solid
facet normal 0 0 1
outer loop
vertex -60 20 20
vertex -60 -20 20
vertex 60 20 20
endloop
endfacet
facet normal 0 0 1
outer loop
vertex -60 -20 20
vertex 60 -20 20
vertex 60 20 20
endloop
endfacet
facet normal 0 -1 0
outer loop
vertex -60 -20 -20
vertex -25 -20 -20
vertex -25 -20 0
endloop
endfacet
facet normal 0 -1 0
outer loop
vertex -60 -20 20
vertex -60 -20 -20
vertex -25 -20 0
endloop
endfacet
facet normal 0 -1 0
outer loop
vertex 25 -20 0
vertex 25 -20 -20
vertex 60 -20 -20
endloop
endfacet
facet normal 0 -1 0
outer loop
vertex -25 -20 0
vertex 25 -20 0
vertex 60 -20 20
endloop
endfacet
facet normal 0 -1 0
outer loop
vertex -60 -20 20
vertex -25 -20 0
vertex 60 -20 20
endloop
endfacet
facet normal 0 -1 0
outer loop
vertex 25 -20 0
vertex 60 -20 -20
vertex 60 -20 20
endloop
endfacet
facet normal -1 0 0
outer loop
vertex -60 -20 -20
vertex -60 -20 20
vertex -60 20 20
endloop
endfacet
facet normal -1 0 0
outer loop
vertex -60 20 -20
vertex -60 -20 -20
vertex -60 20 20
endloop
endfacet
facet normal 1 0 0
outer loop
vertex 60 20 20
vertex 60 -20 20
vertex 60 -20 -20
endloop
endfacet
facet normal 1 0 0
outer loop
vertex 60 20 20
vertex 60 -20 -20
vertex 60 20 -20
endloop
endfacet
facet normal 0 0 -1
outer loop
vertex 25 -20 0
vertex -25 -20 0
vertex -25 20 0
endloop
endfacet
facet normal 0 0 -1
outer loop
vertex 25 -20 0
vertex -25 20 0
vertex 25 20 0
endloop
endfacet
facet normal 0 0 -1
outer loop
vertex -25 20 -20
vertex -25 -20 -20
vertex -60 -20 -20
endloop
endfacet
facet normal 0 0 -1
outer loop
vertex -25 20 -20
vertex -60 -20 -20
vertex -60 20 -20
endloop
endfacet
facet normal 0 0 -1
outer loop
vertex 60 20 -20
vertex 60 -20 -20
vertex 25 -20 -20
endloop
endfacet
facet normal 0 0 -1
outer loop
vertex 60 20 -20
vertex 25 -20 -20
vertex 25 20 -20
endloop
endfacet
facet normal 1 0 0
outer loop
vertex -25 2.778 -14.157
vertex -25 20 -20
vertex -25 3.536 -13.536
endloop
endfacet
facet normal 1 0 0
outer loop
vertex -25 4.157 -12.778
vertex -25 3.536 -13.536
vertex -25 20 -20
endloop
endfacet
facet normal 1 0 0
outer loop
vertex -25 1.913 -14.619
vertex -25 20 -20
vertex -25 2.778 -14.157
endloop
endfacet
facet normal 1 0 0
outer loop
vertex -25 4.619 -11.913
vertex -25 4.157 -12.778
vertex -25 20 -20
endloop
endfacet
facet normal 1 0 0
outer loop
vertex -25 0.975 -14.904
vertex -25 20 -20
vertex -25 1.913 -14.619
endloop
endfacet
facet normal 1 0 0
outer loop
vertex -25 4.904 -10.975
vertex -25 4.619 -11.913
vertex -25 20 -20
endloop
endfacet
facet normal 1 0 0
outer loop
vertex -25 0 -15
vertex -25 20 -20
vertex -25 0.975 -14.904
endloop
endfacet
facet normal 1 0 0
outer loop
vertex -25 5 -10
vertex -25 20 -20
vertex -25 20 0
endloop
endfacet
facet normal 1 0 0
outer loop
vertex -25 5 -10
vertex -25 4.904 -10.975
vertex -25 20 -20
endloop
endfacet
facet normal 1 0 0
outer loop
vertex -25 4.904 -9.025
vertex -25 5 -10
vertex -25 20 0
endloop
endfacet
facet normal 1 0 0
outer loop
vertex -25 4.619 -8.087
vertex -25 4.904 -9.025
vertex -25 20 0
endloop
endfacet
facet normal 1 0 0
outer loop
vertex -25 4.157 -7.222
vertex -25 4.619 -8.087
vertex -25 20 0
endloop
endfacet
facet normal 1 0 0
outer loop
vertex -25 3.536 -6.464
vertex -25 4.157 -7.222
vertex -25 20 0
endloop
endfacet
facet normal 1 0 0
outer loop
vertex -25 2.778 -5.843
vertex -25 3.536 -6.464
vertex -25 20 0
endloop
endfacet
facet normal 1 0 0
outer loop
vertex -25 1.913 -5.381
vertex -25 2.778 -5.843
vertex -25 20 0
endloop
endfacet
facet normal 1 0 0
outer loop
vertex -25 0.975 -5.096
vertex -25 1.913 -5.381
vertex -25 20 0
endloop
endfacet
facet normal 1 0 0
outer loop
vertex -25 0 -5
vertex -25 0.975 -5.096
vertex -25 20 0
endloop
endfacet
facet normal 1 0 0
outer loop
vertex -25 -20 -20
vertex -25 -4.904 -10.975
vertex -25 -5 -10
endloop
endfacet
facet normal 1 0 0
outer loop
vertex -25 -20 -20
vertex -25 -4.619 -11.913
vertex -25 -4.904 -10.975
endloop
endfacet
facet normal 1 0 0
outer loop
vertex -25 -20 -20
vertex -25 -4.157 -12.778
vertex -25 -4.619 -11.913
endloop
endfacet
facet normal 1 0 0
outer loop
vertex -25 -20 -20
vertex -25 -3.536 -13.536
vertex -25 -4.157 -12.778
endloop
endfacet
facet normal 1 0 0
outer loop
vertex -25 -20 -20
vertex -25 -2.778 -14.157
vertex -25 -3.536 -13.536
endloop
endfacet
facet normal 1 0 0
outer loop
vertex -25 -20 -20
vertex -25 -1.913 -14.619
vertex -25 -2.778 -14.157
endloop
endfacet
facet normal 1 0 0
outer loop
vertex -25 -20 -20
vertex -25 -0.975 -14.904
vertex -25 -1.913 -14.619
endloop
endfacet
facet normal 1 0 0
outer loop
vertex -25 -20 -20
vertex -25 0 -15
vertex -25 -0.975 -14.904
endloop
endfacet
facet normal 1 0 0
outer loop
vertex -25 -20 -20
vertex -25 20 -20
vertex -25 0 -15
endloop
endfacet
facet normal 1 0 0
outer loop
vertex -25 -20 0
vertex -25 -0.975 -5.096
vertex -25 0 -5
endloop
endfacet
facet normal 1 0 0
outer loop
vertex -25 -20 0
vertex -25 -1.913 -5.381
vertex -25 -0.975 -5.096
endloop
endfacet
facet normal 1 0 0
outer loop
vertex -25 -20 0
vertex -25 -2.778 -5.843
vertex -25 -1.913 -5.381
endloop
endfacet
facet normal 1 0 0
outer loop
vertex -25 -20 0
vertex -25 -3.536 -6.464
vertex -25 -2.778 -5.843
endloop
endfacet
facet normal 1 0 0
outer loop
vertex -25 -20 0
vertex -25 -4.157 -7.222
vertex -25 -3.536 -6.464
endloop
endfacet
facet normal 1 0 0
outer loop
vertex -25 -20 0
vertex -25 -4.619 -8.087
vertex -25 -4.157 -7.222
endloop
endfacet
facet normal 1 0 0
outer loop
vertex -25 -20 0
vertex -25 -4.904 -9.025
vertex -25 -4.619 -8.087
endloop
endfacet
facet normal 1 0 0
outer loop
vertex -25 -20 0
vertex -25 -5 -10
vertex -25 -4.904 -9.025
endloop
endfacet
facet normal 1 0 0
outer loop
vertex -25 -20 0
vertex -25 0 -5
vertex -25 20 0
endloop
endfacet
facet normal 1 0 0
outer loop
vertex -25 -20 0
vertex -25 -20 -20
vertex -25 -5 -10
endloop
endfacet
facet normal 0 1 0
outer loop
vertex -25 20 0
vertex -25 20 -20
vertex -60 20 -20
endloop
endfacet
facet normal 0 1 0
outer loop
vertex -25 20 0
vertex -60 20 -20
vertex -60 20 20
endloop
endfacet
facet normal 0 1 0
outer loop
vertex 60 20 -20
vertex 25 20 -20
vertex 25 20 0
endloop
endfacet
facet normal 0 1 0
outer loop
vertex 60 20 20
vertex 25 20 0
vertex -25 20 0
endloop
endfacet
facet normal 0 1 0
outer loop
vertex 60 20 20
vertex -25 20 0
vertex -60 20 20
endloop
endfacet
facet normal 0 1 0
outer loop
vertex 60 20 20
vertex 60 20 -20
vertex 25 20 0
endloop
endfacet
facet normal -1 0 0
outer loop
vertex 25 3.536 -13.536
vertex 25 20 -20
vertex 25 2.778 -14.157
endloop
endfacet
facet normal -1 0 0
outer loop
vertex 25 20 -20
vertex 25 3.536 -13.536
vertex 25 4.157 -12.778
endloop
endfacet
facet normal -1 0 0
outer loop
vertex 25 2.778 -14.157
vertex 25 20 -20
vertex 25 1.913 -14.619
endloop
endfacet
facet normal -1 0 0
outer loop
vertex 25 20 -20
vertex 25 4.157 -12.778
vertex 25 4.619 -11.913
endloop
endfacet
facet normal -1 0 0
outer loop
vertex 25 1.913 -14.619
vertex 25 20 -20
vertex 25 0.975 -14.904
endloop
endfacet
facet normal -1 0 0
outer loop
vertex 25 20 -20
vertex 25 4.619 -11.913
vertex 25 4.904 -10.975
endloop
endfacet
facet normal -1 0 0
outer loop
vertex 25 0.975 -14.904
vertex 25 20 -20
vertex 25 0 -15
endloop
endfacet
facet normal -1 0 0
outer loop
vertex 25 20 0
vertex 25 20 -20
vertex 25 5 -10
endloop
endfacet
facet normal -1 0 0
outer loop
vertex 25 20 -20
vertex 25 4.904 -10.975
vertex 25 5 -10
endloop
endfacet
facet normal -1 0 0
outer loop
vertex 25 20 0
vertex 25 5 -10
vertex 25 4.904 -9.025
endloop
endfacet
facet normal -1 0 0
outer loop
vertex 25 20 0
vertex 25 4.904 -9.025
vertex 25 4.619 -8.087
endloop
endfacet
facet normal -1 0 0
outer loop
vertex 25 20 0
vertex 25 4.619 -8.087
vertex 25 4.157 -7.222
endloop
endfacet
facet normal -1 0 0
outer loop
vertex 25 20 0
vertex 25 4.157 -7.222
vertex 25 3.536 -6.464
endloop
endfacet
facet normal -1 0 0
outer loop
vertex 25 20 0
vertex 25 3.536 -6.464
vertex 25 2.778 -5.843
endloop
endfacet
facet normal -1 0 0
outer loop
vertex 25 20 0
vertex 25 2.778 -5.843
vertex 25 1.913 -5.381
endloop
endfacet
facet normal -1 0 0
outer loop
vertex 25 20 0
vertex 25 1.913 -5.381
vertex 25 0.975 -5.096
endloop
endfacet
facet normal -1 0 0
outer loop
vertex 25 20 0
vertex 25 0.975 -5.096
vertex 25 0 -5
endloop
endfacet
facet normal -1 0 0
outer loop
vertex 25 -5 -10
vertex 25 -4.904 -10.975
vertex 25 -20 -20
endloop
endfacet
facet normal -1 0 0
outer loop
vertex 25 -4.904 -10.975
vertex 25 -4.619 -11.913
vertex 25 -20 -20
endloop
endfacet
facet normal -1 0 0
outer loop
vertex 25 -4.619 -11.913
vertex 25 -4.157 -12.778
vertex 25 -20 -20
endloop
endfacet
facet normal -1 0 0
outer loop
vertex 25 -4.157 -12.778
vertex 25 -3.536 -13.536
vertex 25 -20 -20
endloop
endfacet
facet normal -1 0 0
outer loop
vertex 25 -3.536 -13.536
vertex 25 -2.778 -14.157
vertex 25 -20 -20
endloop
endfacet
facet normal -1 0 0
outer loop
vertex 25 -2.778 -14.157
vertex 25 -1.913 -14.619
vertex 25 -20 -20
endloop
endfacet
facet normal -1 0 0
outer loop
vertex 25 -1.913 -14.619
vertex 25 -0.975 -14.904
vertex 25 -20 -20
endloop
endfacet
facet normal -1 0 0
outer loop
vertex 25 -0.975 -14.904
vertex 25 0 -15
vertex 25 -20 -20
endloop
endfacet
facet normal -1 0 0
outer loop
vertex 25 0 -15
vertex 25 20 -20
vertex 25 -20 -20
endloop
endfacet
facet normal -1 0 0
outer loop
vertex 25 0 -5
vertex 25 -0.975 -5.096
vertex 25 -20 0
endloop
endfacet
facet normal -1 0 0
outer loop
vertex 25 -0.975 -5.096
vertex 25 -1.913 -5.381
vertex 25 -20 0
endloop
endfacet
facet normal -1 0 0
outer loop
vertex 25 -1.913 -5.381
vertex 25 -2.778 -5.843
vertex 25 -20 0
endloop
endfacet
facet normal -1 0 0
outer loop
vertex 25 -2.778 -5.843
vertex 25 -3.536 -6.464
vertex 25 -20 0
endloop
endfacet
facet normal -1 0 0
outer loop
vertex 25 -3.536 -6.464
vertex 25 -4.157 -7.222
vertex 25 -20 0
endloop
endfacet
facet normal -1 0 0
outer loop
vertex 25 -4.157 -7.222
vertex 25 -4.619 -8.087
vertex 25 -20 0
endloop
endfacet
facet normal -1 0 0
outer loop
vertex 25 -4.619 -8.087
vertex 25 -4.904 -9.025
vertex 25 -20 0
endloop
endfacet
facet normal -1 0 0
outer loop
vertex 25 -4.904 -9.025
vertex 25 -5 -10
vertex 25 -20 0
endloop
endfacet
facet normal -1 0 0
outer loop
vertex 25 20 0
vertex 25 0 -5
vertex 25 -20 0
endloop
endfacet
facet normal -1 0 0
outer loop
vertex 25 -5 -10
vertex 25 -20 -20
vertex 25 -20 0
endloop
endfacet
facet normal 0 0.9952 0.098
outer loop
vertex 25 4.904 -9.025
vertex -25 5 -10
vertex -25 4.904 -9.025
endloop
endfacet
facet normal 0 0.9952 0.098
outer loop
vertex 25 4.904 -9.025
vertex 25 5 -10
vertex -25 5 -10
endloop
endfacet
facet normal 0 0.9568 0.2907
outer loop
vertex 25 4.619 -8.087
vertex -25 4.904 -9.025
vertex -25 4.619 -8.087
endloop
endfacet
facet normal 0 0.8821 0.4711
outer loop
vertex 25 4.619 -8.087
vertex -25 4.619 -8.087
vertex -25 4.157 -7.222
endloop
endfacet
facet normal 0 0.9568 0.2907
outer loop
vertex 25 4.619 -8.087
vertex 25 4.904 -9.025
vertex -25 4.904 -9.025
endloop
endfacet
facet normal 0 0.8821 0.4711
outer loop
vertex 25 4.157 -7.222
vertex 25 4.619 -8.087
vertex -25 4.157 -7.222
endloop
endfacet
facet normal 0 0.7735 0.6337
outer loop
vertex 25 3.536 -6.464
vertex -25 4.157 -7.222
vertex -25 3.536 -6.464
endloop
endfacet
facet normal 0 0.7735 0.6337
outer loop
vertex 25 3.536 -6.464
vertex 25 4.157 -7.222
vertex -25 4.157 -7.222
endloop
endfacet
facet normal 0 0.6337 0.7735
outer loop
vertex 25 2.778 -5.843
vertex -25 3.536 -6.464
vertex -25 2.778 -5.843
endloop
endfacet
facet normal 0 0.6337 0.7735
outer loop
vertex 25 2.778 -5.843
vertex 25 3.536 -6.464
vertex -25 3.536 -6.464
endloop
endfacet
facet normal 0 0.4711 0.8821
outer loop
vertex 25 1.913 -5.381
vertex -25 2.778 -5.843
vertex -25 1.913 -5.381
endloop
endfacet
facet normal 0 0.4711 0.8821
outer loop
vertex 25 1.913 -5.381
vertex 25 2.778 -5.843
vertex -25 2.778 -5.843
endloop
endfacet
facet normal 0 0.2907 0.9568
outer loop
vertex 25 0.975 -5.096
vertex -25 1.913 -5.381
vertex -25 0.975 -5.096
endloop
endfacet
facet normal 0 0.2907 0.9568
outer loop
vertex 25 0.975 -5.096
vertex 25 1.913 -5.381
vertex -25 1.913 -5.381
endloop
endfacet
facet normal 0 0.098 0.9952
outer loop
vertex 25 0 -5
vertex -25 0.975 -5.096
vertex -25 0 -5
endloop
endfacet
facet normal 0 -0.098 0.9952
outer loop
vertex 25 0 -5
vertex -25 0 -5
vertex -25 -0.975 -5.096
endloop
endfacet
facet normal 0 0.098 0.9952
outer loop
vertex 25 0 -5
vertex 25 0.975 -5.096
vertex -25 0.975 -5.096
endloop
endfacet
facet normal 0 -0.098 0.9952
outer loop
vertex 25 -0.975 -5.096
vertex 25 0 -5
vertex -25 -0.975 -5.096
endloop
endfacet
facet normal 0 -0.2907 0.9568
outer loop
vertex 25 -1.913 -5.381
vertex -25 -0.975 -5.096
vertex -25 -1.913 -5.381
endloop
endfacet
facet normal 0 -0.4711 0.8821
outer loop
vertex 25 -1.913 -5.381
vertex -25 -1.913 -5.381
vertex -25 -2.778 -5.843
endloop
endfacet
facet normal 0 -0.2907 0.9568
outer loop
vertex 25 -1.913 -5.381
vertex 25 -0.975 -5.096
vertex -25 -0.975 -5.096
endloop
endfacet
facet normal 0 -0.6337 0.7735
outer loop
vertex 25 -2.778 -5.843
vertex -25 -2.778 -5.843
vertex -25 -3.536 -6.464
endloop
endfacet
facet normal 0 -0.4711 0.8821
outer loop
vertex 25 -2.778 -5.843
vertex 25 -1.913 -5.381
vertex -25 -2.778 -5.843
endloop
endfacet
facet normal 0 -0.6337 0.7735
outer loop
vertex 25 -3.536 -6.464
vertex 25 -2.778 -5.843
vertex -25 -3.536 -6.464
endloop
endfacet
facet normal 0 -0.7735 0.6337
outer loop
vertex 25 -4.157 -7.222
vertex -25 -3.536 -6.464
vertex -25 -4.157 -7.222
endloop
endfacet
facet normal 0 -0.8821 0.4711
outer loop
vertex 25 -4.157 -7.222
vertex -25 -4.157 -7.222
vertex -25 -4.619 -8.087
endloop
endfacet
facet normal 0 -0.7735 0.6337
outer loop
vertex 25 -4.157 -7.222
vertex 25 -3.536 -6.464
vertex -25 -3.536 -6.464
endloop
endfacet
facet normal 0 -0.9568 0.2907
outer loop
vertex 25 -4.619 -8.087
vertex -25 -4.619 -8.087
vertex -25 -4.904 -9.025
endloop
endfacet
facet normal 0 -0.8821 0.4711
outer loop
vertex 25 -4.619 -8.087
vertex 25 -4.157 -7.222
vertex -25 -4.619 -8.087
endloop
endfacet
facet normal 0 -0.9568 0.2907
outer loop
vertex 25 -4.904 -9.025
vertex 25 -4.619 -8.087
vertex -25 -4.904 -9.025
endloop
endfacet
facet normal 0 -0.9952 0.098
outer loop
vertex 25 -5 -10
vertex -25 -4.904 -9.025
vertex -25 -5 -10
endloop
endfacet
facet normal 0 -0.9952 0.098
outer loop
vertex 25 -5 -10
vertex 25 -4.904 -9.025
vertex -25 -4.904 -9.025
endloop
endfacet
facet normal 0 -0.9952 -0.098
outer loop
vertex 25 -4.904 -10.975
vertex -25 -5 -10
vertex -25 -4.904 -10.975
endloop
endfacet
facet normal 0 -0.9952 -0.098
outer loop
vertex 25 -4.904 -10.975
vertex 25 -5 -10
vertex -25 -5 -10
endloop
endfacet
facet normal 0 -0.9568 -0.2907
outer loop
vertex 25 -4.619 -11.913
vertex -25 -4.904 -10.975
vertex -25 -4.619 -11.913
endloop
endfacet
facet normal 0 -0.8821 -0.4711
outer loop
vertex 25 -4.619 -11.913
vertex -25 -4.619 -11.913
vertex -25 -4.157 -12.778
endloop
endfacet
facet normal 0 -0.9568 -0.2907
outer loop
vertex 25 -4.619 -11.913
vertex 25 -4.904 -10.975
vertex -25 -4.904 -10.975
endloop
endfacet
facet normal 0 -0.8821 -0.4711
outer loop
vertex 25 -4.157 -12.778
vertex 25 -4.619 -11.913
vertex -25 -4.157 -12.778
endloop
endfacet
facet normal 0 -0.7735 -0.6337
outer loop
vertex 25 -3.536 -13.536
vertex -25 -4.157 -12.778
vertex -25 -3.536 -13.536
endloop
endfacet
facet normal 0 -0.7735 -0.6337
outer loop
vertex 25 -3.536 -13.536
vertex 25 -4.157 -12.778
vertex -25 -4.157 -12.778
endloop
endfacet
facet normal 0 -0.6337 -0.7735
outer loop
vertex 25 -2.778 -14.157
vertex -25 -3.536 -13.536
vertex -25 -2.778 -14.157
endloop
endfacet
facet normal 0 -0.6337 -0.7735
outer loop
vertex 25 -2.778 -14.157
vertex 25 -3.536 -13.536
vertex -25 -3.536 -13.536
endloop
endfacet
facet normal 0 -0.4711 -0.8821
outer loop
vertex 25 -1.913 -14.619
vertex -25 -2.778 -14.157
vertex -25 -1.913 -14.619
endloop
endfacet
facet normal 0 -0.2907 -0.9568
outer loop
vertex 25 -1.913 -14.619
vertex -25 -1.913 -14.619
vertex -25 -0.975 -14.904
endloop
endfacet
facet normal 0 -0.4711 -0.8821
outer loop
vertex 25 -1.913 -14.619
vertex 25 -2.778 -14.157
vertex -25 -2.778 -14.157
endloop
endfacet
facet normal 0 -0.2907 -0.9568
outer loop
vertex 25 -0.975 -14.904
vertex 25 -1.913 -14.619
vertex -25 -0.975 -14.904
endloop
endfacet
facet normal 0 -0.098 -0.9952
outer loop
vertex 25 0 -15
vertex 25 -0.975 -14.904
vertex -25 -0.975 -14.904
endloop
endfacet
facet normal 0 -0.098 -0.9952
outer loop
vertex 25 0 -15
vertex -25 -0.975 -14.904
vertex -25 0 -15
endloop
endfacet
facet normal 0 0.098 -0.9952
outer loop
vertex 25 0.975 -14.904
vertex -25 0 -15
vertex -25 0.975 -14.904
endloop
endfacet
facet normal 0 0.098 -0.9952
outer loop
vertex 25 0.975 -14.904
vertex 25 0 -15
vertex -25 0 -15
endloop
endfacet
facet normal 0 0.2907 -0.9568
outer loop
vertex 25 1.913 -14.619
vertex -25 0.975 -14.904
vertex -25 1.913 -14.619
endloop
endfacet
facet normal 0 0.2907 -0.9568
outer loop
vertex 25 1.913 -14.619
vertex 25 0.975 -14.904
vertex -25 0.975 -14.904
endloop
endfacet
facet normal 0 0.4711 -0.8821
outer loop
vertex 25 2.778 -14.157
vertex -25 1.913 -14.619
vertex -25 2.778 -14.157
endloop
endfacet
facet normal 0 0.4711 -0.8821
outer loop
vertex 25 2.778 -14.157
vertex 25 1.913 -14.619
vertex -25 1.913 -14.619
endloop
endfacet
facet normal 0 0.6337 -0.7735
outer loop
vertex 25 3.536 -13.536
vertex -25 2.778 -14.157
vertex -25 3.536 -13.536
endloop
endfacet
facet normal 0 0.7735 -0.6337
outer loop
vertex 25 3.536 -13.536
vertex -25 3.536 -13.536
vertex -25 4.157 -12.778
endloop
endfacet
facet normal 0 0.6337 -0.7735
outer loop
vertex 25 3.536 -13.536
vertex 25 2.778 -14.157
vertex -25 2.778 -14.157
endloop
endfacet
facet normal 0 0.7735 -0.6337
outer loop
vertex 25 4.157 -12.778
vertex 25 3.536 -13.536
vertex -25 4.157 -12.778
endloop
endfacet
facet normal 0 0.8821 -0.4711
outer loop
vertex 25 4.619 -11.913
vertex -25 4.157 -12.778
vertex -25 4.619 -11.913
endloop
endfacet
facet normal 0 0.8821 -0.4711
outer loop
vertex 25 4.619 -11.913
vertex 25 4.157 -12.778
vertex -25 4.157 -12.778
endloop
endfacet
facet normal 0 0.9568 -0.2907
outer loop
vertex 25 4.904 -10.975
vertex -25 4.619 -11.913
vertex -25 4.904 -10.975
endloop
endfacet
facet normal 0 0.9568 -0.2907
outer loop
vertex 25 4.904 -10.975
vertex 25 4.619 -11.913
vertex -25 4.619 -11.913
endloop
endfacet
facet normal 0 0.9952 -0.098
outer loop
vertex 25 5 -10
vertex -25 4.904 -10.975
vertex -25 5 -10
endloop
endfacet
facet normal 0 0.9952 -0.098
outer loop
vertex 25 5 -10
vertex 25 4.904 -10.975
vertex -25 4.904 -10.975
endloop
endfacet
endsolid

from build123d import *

# Parameters (mm, degrees)
F0_W     = 40
F0_H     = 40
F1_DEPTH = 60
F2_W     = 50
F2_H     = 20
F3_DEPTH = 40.001
F4_R     = 5
F5_DEPTH = 25


with BuildPart() as f1:
    # F0 (on Right) → F1 (new body, symmetric)
    with BuildSketch(Plane.YZ):
        Rectangle(F0_W, F0_H)
    extrude(amount=F1_DEPTH, both=True)

    # F2 (on face) → F3 (cut, through all)
    with BuildSketch(Plane.XZ.offset(20)):
        with Locations((0, -10)):
            Rectangle(F2_W, F2_H)
    extrude(amount=-F3_DEPTH, mode=Mode.SUBTRACT)

    # F4 (on Right) → F5 (join, symmetric)
    with BuildSketch(Plane.YZ):
        with Locations((0, -10)):
            Circle(F4_R)
    extrude(amount=F5_DEPTH, both=True)


solid = f1.part
